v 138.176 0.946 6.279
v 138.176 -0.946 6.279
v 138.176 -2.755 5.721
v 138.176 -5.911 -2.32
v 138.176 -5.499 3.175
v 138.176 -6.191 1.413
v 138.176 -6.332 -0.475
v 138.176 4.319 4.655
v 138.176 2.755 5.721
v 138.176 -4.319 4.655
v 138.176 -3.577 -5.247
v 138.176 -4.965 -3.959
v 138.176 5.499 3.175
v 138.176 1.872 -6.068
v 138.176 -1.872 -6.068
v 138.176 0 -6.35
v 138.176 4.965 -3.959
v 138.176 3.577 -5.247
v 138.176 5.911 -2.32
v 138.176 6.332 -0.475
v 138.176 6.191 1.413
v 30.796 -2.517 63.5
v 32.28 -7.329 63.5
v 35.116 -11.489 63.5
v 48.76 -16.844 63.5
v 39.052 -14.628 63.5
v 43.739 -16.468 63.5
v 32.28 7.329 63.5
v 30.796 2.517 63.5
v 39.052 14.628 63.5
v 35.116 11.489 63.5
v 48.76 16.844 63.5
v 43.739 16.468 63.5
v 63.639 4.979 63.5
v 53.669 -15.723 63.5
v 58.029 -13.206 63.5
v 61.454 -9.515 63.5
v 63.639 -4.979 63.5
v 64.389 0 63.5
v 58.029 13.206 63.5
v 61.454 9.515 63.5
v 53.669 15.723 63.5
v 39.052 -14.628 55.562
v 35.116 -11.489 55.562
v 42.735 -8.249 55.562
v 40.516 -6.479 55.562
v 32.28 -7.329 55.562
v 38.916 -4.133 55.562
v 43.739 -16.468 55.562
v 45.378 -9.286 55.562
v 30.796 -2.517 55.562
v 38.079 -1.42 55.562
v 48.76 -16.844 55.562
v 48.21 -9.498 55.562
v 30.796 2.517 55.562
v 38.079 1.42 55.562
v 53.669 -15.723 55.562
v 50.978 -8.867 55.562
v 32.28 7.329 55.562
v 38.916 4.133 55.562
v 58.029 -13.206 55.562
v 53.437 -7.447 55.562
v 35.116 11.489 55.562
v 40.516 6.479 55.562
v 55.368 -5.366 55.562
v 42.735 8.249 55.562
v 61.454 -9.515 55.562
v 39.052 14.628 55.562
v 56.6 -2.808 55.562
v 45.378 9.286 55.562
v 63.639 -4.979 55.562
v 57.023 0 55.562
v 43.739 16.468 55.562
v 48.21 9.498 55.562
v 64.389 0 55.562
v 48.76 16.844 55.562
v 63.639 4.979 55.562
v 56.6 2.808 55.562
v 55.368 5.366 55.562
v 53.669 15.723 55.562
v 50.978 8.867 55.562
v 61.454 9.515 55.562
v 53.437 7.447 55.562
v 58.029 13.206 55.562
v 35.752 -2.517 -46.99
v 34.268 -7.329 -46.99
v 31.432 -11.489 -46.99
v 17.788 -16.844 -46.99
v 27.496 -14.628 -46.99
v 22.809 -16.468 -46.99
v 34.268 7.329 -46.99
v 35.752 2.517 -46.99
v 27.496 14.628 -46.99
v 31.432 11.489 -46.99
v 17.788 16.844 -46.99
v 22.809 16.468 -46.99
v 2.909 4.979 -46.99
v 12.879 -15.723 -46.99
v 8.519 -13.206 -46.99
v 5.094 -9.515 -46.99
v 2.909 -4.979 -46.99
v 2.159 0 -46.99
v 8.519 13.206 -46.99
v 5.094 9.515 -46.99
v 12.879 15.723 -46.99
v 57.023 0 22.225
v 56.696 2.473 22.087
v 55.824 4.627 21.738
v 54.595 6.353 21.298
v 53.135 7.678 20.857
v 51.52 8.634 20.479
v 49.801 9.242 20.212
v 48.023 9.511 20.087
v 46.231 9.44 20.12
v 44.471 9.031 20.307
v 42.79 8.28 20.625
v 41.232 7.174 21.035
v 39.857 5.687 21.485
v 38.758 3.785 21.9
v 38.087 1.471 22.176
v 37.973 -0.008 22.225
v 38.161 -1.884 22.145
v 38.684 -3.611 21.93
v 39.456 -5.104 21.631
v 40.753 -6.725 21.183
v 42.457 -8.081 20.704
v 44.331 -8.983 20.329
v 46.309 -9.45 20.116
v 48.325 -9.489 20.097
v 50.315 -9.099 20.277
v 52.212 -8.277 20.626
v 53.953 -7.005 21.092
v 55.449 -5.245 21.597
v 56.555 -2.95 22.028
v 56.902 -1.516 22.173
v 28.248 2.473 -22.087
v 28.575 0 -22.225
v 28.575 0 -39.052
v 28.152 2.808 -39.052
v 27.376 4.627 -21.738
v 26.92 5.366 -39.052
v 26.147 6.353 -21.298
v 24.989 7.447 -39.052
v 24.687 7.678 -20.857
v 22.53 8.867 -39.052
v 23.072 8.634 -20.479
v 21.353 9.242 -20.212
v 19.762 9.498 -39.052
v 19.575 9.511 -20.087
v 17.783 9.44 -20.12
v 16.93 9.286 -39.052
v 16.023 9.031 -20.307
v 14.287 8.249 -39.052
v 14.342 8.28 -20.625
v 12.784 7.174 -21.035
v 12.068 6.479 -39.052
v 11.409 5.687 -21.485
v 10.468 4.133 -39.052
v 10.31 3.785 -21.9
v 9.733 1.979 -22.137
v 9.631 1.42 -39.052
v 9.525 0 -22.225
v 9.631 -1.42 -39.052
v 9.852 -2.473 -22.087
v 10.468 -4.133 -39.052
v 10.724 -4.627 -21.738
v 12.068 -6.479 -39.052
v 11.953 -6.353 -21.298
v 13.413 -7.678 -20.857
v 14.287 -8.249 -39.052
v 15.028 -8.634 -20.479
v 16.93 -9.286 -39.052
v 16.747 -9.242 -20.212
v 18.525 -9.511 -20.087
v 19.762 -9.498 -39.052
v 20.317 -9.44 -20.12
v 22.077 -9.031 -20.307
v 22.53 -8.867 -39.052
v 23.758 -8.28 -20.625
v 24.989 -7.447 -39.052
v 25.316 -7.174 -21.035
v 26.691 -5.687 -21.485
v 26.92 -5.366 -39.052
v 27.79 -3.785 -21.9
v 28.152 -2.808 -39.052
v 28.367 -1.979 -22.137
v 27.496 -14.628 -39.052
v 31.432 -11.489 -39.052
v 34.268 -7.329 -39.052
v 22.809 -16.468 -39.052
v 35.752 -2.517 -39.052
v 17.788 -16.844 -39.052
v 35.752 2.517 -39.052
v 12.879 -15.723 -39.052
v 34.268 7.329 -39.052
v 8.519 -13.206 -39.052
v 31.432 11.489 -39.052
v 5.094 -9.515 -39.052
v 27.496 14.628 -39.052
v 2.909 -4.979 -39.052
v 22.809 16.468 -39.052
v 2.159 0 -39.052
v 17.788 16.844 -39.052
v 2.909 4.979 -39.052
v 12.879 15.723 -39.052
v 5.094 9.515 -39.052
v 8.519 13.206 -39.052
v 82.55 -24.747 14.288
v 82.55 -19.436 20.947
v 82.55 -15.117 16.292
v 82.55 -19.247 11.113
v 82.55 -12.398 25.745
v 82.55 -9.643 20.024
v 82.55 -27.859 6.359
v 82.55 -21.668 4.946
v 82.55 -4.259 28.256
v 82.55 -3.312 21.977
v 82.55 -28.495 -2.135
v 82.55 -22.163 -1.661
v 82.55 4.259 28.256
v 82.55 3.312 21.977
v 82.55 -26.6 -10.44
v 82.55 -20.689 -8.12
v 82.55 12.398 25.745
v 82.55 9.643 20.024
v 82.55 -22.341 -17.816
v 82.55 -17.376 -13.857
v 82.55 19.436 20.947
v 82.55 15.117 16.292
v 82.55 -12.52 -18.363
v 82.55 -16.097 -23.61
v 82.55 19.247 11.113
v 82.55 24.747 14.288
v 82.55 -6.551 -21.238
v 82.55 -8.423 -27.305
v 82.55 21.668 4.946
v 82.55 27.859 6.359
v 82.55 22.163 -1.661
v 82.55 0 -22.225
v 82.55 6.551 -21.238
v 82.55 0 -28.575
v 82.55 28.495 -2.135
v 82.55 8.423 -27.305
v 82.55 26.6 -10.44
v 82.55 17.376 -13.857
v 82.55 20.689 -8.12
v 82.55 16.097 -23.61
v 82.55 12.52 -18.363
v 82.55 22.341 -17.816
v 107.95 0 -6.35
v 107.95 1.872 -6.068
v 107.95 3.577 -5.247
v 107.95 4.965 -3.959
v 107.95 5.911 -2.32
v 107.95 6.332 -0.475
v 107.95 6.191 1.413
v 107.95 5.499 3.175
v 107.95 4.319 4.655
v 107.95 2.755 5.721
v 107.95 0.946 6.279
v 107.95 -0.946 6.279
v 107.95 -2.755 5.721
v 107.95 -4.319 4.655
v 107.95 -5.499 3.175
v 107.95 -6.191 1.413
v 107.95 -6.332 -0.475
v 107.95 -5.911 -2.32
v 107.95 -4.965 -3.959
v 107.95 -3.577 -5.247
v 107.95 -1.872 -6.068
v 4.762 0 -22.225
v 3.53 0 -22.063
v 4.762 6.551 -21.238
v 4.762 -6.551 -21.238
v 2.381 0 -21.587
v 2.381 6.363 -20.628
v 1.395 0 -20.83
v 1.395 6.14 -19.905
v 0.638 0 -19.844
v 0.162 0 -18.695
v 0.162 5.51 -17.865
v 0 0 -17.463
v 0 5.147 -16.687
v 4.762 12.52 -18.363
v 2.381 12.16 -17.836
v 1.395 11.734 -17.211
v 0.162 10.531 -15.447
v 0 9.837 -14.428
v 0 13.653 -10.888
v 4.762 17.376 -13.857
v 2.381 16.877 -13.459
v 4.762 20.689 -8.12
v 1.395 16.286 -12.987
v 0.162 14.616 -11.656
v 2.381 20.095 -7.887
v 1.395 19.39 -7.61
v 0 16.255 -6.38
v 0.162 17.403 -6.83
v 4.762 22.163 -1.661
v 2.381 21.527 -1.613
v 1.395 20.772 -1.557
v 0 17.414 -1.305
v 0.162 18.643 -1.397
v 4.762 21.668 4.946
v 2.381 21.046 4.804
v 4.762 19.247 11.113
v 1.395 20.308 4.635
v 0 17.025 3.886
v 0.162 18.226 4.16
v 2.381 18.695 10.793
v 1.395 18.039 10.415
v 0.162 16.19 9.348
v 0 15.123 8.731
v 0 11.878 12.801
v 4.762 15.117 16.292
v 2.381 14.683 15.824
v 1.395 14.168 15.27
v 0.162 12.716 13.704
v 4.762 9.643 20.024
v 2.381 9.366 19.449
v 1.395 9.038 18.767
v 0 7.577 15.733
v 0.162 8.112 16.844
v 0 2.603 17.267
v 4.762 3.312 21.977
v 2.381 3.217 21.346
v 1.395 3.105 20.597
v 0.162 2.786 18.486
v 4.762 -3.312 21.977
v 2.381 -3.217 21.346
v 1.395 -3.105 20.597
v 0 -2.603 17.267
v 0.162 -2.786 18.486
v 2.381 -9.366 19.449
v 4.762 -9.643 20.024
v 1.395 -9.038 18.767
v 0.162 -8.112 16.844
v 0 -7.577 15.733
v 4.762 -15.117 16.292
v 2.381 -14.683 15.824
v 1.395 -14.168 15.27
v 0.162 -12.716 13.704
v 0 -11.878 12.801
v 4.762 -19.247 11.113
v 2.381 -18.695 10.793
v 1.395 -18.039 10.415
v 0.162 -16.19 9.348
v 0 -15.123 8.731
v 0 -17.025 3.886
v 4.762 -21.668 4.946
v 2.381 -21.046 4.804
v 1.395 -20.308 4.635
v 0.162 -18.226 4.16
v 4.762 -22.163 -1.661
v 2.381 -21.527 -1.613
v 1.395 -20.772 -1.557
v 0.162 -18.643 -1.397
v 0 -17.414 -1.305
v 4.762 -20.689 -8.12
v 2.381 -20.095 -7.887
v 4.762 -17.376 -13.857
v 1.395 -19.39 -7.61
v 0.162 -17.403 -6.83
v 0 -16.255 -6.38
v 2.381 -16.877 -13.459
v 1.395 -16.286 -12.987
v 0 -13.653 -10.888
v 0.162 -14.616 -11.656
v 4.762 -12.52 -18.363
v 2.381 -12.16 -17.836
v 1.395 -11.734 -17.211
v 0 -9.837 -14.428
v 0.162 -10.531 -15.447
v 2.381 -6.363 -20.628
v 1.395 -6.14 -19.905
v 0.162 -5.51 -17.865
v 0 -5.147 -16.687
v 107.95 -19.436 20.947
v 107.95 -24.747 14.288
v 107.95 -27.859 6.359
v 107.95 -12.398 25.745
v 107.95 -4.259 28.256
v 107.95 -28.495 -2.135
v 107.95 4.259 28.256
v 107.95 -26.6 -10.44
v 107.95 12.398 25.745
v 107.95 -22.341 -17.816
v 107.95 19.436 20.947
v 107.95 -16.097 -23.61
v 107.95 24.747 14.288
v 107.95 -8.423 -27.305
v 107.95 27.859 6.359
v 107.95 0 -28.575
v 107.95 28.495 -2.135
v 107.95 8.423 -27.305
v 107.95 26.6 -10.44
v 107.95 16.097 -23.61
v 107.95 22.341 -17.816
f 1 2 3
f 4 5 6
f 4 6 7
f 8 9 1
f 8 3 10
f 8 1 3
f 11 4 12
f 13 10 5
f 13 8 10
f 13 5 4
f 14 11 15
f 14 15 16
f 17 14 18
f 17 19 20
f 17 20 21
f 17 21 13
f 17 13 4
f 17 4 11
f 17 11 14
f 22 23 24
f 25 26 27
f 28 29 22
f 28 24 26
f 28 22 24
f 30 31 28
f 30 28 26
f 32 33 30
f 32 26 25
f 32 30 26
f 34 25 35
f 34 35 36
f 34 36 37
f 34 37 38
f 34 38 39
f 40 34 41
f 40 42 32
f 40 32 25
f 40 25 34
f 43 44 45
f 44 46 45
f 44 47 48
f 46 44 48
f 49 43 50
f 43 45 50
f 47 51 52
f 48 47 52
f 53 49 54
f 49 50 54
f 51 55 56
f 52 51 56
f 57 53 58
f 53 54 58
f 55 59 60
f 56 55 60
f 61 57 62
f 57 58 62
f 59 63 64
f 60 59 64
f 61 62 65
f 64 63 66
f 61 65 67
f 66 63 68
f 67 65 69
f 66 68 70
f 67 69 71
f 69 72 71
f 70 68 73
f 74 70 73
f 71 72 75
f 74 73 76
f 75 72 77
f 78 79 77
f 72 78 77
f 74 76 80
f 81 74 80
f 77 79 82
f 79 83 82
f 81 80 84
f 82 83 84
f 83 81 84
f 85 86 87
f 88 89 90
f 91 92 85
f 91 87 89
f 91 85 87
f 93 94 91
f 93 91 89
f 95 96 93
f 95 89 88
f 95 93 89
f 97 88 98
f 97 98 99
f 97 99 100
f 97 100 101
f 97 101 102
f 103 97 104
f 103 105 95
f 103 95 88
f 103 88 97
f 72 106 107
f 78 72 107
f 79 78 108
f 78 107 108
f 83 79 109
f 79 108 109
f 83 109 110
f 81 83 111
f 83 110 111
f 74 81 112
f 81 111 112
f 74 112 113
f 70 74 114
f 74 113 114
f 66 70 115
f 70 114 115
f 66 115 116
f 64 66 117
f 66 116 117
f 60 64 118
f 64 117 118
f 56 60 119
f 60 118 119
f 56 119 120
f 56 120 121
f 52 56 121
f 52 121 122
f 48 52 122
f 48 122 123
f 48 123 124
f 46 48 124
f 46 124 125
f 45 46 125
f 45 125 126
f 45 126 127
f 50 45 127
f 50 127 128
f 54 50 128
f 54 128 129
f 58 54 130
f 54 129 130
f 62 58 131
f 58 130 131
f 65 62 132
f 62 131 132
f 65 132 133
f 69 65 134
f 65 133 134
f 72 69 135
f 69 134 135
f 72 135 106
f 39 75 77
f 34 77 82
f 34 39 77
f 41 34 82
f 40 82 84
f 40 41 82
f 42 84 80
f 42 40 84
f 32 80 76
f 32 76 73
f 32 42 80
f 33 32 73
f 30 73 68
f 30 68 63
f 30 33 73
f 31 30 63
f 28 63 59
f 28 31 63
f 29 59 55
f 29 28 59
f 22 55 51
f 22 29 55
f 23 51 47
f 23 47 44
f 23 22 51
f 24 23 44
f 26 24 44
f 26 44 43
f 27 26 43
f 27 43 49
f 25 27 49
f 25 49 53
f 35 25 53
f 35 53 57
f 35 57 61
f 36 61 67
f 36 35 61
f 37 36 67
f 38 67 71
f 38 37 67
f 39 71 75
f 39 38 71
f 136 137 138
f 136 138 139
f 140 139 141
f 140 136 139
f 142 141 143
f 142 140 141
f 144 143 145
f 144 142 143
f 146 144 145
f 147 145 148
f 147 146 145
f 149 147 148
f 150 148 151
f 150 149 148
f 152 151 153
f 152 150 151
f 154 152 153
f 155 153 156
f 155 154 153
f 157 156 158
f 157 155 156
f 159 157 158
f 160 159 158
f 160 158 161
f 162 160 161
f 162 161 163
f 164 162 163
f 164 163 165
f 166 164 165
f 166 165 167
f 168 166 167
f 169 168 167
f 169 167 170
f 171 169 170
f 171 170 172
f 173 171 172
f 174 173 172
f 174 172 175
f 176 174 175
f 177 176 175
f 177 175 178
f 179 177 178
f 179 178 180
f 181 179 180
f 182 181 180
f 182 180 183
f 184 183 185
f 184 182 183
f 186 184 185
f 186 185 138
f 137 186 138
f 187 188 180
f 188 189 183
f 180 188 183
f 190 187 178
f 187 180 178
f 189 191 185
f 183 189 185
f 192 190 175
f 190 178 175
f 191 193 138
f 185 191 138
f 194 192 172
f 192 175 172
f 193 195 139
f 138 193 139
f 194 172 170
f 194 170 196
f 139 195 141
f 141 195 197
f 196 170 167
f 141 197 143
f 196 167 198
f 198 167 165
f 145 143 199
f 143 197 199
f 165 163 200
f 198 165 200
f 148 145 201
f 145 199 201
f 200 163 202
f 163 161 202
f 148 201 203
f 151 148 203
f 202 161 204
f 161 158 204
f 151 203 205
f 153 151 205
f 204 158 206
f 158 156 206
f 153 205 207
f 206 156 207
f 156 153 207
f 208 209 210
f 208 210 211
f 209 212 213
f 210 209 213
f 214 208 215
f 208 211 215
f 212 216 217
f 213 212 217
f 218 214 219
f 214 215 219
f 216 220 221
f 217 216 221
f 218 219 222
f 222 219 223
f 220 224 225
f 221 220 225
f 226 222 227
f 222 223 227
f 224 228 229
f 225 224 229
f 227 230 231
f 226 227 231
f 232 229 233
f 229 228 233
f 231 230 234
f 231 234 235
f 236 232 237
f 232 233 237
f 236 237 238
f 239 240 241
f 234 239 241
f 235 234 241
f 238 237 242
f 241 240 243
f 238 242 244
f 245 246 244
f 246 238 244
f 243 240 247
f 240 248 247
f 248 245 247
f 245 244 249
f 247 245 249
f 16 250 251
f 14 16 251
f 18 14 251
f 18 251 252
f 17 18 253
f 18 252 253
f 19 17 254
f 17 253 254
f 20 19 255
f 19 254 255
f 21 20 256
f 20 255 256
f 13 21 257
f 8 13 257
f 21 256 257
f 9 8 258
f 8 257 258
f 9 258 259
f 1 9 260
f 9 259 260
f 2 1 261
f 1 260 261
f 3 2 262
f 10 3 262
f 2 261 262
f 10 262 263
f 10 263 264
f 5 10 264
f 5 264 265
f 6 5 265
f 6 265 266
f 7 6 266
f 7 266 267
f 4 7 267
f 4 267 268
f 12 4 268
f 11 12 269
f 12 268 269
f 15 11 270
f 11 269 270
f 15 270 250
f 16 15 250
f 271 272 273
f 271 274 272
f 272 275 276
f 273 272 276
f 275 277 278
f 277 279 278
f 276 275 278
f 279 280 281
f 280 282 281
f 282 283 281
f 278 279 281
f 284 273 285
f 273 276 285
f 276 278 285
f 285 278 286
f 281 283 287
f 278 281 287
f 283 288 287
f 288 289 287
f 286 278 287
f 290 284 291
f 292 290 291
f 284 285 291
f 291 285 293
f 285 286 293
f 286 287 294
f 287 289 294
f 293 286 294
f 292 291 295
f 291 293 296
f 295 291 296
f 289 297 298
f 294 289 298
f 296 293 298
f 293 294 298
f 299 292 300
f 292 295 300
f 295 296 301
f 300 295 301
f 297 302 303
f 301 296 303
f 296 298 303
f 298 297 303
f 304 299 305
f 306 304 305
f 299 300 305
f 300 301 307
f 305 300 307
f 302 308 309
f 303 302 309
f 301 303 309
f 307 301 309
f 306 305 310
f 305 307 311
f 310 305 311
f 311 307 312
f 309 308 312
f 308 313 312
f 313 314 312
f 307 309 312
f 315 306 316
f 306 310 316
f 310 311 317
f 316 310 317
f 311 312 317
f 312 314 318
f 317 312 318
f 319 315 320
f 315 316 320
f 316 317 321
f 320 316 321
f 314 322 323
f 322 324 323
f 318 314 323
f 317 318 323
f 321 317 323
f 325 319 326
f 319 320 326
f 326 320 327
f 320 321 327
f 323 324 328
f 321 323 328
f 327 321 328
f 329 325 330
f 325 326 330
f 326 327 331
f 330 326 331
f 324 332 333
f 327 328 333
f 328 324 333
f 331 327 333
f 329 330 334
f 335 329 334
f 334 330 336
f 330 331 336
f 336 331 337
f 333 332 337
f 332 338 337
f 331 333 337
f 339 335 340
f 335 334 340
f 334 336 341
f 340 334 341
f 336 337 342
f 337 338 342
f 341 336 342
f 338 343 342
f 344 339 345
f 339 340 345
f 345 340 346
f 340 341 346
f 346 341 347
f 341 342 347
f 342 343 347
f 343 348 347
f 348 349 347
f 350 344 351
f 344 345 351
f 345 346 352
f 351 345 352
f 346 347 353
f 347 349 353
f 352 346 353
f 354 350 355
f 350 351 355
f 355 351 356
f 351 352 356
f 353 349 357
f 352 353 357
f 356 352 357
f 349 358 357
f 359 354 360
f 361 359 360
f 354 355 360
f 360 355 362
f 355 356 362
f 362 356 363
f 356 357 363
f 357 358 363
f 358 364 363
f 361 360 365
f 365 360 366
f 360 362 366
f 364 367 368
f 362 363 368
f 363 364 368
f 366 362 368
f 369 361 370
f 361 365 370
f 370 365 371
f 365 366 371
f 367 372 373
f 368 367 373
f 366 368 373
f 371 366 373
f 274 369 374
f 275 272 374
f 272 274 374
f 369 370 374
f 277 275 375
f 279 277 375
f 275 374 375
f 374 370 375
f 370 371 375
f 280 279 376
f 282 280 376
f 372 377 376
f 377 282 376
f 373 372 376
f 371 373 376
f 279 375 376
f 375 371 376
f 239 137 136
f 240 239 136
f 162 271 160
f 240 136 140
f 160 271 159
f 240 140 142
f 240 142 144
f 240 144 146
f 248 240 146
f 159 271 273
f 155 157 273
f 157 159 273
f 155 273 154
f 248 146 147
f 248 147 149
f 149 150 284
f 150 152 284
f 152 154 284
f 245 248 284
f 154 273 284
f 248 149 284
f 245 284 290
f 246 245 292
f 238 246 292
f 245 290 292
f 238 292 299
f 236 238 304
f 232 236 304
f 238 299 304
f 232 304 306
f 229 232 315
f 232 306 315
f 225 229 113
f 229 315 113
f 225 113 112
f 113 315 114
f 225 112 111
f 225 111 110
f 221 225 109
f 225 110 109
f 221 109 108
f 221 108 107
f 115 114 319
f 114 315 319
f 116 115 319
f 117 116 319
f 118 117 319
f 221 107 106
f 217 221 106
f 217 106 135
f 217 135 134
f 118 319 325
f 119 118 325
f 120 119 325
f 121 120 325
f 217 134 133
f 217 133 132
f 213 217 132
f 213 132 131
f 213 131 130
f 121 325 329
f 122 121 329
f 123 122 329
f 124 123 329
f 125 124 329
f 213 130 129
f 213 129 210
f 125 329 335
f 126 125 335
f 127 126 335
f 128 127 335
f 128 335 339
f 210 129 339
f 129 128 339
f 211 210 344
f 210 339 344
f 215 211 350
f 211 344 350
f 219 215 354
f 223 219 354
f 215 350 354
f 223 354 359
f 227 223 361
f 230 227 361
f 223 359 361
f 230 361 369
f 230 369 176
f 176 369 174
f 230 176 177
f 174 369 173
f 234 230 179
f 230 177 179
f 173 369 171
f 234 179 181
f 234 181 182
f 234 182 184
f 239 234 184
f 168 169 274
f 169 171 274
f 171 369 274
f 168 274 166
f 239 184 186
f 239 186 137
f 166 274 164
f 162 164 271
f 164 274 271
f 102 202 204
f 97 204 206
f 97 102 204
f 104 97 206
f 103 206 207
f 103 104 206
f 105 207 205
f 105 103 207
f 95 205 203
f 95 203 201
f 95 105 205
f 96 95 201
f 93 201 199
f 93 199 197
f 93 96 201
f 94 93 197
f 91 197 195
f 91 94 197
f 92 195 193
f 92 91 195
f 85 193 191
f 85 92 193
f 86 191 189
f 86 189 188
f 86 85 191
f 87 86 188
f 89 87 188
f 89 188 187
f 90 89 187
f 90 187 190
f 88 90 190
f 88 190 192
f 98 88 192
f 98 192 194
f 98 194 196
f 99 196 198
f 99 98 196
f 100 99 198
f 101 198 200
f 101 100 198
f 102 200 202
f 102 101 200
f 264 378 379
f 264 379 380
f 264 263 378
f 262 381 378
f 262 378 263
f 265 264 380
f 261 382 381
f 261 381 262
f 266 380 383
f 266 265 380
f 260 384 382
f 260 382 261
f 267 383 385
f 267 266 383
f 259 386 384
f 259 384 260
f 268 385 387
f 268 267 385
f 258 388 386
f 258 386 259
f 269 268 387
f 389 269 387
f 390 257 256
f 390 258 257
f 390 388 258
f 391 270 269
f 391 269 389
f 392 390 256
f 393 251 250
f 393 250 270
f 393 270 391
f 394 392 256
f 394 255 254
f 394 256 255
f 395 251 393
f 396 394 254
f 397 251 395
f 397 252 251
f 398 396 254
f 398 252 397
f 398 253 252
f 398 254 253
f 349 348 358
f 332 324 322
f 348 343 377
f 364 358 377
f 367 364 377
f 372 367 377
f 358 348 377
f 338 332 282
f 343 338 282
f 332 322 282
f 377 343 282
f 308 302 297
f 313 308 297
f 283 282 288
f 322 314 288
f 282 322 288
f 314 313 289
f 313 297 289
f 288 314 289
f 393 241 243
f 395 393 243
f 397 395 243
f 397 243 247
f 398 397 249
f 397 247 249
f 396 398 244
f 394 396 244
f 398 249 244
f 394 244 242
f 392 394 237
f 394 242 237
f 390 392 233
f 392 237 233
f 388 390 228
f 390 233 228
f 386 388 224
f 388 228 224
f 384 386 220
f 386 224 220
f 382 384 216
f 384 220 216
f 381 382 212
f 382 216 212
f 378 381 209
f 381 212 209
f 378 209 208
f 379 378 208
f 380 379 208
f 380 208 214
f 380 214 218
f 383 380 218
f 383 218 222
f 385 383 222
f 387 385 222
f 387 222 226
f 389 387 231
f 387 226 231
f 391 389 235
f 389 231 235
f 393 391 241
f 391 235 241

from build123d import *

# Parameters (mm, degrees)
SKETCH1_R      = 22.225
EXTRUDE1_DEPTH = 82.55
SKETCH2_R      = 9.525
EXTRUDE2_DEPTH = 63.5
SKETCH3_R      = 9.525
EXTRUDE3_DEPTH = 46.99
SKETCH4_R      = 16.891
EXTRUDE4_DEPTH = 7.9375
SKETCH5_R      = 16.891
EXTRUDE5_DEPTH = 7.9375
SKETCH6_R      = 28.575
EXTRUDE6_DEPTH = 25.4
SKETCH7_R      = 6.35
EXTRUDE7_DEPTH = 30.226
FILLET1_R      = 4.7625


with BuildPart() as part:
    # Sketch1 → Extrude1 (new body)
    with BuildSketch(Plane(origin=(0, 0, 0), x_dir=(0, 0, -1), z_dir=(1, 0, 0))):
        Circle(SKETCH1_R)
    extrude(amount=EXTRUDE1_DEPTH)

    # Sketch2 → Extrude2 (add)
    with BuildSketch(Plane.XY):
        with Locations((47.498, 0)):
            Circle(SKETCH2_R)
    extrude(amount=EXTRUDE2_DEPTH)

    # Sketch3 → Extrude3 (add)
    with BuildSketch(Plane.XY):
        with Locations((19.05, 0)):
            Circle(SKETCH3_R)
    extrude(amount=-EXTRUDE3_DEPTH)

    # Sketch4 → Extrude4 (add)
    with BuildSketch(Plane(origin=(0, 0, -46.99), x_dir=(-1, 0, 0), z_dir=(0, 0, -1))):
        with Locations((-19.05, 0)):
            Circle(SKETCH4_R)
    extrude(amount=-EXTRUDE4_DEPTH)

    # Sketch5 → Extrude5 (add)
    with BuildSketch(Plane.XY.offset(63.5)):
        with Locations((47.498, 0)):
            Circle(SKETCH5_R)
    extrude(amount=-EXTRUDE5_DEPTH)

    # Sketch6 → Extrude6 (add)
    with BuildSketch(Plane(origin=(82.55, 0, 0), x_dir=(0, 0, -1), z_dir=(1, 0, 0))):
        Circle(SKETCH6_R)
    extrude(amount=EXTRUDE6_DEPTH)

    # Sketch7 → Extrude7 (add)
    with BuildSketch(Plane(origin=(107.95, 0, 0), x_dir=(0, 0, -1), z_dir=(1, 0, 0))):
        Circle(SKETCH7_R)
    extrude(amount=EXTRUDE7_DEPTH)

    # Fillet1
    fillet1_edges = [part.edges().sort_by_distance(p)[0] for p in [
        (0, 0, 22.225),
    ]]
    fillet(fillet1_edges, radius=FILLET1_R)


solid = part.part
